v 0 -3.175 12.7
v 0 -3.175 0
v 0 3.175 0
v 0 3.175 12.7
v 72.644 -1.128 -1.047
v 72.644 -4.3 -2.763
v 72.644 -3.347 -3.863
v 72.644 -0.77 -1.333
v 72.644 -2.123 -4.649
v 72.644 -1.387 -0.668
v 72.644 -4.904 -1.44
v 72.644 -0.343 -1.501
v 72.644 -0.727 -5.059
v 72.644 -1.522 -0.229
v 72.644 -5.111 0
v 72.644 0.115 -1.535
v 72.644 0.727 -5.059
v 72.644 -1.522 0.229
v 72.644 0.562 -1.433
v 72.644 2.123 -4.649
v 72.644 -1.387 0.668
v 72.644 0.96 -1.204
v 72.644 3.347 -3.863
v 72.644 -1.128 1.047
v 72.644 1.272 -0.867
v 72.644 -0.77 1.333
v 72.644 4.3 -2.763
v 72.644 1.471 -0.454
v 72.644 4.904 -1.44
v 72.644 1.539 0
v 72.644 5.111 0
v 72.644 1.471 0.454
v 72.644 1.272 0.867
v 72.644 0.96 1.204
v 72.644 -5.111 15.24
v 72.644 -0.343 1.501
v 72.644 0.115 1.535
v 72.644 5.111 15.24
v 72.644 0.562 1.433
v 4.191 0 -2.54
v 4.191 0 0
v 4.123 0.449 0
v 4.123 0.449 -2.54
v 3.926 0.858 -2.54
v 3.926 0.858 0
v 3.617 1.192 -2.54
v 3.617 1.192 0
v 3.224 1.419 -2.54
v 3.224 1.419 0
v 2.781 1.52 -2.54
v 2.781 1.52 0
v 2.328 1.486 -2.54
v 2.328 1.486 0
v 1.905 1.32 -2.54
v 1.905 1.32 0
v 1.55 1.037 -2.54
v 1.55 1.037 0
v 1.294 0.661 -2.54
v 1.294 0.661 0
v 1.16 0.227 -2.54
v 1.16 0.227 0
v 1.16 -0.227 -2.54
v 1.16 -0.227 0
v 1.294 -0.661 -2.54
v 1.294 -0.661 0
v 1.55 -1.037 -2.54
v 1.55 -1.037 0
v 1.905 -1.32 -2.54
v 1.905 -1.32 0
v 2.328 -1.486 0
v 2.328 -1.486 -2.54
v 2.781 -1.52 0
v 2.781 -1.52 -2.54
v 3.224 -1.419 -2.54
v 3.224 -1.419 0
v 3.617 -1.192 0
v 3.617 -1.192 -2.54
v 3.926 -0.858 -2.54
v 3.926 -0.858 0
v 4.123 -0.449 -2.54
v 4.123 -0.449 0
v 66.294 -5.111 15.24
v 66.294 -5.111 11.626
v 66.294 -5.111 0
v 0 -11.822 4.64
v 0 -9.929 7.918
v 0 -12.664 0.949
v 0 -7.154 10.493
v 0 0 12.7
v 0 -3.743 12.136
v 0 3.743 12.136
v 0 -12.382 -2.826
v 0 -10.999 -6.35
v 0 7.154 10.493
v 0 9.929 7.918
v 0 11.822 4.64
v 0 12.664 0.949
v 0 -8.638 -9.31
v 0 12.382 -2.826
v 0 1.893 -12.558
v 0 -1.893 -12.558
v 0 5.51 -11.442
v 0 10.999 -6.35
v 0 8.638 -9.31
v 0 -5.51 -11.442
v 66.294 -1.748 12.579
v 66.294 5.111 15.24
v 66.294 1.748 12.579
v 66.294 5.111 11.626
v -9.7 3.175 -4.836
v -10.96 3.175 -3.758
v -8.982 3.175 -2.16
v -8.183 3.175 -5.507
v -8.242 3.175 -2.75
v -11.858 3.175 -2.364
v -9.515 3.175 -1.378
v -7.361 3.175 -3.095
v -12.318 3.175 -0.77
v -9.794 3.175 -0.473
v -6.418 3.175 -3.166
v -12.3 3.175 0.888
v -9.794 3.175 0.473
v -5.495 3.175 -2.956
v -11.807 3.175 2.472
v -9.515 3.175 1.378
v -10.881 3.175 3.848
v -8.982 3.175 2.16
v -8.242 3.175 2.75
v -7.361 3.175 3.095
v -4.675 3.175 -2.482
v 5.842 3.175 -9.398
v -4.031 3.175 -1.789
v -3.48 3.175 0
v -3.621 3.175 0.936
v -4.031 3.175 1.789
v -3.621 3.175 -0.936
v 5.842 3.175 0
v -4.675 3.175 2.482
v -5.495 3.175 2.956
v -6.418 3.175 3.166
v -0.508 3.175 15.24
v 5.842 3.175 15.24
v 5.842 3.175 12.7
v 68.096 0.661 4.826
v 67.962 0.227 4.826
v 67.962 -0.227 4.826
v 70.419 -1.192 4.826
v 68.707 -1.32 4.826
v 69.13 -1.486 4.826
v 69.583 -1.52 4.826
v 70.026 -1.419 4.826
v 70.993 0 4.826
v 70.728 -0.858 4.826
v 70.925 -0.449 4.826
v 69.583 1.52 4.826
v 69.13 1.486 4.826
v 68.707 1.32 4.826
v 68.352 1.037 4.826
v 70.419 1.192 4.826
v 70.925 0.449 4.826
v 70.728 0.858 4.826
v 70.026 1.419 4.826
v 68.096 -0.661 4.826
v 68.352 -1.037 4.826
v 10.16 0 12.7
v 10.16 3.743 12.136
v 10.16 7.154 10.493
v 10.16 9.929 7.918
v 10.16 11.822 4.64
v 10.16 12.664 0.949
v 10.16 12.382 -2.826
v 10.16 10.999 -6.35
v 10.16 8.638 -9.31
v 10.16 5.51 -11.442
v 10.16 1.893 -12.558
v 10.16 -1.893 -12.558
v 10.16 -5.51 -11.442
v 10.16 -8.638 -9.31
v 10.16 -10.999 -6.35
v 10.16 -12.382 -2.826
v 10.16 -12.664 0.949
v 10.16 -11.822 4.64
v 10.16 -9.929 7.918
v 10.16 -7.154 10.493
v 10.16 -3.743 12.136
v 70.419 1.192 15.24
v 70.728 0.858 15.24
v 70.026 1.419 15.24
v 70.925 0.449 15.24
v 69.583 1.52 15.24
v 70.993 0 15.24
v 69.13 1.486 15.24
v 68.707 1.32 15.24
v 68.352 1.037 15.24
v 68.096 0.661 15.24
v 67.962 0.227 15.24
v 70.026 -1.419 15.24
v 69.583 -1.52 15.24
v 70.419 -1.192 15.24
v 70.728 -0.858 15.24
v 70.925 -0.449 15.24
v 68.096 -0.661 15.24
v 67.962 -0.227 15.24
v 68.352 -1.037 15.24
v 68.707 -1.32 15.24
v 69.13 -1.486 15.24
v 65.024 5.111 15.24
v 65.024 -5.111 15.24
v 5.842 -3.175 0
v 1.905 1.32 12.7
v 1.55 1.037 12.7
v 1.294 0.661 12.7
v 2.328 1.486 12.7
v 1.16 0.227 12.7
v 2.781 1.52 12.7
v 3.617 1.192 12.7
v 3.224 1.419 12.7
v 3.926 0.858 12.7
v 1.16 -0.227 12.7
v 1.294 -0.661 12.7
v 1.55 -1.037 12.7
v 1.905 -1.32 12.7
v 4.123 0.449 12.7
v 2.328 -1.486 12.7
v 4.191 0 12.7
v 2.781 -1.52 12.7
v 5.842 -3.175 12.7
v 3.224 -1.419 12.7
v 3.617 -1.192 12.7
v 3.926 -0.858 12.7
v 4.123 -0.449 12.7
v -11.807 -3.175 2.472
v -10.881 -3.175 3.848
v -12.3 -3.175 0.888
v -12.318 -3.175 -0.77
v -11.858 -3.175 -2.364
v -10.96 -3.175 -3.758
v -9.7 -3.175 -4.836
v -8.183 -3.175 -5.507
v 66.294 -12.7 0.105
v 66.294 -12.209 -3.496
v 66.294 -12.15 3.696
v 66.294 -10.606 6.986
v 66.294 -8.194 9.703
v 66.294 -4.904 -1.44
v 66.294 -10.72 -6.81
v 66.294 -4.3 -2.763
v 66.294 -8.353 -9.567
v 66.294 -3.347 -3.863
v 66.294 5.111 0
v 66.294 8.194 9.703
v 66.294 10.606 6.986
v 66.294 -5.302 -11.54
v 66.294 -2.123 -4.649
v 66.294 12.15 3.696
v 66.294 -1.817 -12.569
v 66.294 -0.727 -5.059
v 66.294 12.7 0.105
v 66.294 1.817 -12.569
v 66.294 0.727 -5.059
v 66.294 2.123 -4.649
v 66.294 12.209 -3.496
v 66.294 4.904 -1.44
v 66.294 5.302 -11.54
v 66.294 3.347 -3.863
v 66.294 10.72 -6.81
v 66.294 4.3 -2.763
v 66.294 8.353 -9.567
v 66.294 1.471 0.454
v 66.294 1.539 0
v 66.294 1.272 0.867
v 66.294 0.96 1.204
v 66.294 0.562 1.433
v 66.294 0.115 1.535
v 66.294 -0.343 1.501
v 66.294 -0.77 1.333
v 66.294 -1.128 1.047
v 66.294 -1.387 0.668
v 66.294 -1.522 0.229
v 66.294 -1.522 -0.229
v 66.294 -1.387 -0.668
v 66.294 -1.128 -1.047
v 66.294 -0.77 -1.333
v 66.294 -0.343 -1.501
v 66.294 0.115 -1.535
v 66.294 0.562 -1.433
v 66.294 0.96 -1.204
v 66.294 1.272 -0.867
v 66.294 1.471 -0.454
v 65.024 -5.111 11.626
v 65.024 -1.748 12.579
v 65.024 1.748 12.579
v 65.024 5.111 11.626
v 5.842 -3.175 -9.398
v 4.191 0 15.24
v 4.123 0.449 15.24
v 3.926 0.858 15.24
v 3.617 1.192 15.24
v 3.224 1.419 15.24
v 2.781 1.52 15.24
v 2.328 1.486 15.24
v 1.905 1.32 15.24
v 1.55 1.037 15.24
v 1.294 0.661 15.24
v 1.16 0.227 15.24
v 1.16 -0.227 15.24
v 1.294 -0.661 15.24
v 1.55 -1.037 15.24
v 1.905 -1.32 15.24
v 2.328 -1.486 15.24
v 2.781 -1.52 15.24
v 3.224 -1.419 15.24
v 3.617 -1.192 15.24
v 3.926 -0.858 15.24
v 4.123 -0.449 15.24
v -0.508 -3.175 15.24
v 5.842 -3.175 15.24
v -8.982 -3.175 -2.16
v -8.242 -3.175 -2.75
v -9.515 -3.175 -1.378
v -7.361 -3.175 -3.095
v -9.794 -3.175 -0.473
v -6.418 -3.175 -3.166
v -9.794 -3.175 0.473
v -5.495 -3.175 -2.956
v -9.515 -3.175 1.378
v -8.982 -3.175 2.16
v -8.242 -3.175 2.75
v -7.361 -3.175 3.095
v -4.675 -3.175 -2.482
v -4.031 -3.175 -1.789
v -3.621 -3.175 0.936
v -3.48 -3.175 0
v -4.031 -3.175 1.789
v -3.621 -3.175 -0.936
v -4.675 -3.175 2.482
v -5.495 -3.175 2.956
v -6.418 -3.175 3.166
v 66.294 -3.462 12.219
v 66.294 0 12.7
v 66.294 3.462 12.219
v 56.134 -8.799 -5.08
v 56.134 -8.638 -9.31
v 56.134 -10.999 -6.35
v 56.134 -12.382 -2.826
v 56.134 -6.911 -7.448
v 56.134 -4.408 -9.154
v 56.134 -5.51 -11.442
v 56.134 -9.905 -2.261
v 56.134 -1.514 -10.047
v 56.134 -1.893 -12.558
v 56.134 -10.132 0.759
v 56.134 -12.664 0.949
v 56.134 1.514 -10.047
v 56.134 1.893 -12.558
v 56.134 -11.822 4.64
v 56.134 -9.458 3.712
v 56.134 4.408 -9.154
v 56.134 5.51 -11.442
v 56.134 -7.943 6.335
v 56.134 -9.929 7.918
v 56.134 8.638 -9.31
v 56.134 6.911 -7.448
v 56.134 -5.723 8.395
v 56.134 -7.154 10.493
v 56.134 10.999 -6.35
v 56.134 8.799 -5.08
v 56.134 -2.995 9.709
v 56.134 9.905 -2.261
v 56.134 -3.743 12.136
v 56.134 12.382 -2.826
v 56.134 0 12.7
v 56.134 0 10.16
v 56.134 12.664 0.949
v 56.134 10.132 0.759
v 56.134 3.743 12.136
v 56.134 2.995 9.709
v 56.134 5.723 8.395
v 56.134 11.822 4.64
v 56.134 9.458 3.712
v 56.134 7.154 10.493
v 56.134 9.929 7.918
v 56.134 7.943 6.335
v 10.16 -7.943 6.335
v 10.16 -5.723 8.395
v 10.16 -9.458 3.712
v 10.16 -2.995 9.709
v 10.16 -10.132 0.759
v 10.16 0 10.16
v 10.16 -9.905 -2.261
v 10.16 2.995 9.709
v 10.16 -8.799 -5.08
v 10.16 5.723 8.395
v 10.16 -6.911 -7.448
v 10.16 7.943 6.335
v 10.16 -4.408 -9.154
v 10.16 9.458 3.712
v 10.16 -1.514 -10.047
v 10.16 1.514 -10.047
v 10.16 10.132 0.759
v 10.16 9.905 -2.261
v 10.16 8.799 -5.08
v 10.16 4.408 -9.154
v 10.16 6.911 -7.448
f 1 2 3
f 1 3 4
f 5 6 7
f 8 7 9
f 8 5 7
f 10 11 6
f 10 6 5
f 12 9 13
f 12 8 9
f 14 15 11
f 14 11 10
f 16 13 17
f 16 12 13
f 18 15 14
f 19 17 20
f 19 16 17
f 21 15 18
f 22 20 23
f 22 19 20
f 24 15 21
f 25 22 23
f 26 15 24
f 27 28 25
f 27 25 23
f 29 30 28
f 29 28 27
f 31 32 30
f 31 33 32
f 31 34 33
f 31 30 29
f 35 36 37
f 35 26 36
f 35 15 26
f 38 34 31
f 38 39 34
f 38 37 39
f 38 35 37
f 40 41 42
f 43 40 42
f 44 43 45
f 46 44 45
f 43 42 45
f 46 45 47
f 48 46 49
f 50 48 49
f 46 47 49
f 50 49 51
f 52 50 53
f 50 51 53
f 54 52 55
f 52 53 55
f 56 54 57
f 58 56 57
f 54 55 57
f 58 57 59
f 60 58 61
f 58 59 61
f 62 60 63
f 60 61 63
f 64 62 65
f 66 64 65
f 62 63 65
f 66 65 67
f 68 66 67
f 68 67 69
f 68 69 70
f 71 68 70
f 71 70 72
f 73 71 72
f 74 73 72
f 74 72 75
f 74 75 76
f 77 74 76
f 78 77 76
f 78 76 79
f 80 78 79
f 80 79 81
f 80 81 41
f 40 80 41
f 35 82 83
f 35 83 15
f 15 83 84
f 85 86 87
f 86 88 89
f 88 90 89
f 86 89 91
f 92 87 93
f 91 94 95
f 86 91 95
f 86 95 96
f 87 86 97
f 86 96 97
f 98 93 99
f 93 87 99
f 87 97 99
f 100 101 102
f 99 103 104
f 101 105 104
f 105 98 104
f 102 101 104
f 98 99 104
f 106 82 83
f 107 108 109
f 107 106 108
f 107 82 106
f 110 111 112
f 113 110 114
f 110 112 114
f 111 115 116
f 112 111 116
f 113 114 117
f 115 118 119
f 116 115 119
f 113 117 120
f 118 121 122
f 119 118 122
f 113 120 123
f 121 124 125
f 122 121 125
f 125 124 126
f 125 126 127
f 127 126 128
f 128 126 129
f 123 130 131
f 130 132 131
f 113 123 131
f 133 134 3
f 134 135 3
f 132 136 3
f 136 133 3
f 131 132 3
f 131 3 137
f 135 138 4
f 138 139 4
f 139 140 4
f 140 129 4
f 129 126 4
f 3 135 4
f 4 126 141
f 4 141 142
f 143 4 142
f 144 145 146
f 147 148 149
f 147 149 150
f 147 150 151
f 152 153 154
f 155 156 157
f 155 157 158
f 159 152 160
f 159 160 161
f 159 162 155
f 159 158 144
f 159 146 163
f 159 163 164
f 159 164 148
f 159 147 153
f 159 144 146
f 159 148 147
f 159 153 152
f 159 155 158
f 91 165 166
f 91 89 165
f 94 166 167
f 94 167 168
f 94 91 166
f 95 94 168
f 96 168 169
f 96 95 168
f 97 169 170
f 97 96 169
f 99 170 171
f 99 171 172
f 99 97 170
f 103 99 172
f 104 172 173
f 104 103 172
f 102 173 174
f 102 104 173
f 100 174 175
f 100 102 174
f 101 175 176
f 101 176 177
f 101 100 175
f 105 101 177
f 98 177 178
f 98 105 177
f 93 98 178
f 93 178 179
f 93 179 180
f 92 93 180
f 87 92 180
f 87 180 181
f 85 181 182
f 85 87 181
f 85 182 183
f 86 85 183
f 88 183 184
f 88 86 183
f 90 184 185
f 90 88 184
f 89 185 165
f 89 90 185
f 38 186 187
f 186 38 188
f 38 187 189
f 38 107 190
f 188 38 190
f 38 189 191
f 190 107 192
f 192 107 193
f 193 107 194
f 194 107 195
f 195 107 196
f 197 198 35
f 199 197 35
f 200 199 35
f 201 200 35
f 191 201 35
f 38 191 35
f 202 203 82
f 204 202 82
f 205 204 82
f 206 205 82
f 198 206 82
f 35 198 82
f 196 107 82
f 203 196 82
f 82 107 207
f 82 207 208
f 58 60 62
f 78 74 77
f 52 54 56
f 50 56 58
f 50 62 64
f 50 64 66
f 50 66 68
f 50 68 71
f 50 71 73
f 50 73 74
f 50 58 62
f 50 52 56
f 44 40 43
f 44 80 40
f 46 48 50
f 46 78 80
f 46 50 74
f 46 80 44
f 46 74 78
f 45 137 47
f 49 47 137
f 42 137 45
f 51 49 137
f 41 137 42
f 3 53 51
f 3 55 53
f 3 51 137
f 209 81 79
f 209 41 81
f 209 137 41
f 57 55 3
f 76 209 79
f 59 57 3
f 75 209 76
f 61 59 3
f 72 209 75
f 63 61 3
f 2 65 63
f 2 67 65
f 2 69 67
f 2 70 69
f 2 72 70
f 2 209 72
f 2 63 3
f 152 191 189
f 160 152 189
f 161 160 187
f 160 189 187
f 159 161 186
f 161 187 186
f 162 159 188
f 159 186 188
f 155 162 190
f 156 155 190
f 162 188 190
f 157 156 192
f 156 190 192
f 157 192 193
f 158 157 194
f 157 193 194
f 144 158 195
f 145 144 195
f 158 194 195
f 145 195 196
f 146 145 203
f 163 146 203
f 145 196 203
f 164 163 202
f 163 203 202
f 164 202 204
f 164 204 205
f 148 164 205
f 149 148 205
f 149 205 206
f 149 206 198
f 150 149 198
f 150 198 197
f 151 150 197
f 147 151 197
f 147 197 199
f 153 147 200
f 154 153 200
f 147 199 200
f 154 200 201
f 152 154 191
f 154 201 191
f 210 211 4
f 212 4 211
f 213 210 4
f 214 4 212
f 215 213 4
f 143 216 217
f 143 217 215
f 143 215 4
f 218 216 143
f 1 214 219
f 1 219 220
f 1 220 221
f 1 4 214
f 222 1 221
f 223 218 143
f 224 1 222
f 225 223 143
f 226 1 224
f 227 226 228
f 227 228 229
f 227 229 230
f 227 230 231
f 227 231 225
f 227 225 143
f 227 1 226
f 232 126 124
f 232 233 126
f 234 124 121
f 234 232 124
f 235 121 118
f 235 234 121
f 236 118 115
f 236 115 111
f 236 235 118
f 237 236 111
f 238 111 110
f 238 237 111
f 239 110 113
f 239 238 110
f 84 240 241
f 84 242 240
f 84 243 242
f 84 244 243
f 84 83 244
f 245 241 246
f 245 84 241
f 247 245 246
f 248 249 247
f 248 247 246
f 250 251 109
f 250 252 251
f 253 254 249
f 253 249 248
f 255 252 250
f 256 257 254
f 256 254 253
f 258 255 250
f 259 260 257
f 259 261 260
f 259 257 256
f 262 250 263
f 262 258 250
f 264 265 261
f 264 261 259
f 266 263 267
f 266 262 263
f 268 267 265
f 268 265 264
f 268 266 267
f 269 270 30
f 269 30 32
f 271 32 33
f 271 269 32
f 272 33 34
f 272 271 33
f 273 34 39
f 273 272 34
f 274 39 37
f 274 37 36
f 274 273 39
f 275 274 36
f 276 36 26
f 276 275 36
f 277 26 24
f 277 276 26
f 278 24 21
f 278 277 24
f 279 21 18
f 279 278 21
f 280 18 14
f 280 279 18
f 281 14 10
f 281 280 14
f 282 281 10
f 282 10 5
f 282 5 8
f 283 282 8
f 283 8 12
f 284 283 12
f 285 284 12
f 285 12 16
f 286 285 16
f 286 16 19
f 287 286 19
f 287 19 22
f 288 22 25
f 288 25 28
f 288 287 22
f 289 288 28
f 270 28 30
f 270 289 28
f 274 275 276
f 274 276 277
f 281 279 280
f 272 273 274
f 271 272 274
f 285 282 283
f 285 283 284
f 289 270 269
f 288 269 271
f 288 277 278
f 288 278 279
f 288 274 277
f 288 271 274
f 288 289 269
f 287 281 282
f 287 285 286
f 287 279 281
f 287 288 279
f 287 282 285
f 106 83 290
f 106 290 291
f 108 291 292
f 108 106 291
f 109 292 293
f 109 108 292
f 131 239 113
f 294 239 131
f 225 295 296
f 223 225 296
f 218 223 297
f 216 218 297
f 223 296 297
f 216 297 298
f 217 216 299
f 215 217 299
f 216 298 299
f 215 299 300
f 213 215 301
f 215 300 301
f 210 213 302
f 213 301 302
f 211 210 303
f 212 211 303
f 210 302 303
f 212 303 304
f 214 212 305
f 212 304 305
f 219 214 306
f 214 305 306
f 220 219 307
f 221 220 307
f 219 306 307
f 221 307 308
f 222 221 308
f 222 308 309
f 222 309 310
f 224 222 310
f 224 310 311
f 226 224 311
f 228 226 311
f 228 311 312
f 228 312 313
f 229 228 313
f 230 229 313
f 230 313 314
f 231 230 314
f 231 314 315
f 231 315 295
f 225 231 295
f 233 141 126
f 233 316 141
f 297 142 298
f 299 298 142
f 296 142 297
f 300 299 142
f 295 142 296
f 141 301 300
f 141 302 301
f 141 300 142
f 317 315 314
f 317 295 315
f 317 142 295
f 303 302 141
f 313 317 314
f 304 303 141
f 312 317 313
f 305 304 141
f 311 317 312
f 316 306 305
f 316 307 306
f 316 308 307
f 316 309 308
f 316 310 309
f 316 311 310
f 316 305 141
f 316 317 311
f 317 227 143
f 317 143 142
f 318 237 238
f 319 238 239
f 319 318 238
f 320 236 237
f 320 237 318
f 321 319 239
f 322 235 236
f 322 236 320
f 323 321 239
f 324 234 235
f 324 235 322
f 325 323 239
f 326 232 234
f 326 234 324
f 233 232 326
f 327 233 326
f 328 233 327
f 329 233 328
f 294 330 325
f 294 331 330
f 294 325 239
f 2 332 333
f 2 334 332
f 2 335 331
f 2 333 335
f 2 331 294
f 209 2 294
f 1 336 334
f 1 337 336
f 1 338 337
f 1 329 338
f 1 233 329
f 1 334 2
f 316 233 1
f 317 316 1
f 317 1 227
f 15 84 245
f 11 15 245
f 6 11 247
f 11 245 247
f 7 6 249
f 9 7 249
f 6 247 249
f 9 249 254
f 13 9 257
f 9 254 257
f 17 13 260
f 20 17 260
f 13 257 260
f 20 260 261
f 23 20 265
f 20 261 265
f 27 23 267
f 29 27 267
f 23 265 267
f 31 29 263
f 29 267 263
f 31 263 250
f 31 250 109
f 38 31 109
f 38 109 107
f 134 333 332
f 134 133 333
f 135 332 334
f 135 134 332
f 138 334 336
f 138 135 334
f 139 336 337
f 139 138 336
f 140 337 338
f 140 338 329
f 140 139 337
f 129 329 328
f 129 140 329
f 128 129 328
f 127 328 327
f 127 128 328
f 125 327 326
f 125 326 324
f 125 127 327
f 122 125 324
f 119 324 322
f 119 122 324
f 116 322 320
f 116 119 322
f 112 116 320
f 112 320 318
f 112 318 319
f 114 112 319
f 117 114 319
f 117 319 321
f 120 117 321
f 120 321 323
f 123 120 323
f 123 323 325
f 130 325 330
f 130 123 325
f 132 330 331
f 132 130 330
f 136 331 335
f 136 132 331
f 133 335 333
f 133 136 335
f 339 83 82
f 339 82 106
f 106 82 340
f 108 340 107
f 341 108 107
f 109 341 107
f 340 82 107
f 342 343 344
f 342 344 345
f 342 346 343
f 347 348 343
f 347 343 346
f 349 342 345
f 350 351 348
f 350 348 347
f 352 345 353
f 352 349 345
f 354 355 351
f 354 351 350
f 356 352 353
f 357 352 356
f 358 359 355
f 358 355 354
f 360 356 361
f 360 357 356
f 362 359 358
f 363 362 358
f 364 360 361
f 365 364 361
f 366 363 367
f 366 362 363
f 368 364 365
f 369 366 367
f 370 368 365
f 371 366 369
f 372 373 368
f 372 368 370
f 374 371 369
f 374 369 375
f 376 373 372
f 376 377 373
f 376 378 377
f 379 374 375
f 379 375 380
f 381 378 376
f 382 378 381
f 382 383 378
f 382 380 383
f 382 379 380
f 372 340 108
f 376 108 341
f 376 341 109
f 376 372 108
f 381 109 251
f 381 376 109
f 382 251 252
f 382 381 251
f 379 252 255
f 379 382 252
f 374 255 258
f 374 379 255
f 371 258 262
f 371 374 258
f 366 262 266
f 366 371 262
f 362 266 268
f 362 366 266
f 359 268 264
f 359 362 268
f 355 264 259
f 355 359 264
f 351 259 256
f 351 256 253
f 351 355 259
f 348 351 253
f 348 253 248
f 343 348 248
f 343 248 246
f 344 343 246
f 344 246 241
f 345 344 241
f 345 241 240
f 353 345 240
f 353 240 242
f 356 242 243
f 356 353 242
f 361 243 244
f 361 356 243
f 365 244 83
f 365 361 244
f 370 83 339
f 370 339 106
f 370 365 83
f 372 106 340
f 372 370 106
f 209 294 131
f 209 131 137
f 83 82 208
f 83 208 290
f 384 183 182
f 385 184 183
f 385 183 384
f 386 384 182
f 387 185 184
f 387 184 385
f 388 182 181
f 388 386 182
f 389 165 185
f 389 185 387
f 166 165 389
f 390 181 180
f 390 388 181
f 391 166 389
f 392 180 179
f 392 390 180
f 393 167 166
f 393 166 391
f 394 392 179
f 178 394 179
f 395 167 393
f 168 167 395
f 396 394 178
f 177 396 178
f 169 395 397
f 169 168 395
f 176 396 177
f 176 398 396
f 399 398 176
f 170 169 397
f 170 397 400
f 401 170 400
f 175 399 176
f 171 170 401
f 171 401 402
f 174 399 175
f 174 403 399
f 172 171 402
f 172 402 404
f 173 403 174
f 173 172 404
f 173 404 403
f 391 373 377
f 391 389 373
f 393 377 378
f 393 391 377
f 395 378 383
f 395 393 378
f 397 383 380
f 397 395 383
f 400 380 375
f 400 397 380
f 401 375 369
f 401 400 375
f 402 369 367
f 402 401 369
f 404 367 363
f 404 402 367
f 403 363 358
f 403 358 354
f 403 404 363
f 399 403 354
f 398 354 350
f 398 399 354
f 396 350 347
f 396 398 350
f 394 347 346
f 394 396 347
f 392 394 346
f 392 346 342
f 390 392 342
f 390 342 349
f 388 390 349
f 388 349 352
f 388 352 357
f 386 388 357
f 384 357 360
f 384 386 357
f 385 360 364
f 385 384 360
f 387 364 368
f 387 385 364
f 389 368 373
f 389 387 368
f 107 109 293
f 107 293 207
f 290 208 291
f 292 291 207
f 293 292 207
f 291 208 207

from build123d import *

# Parameters (mm, degrees)
F0_W      = 5.842
F0_H      = 12.7
F0_R      = 3.175
F2_DEPTH  = 3.175
F3_R      = 1.5393438835
F4_DEPTH  = 6.35
F5_DEPTH  = 1.27
F6_R      = 1.524
F9_DEPTH  = 17.78
F7_R      = 1.524
F10_DEPTH = 10.414


with BuildPart() as f1:
    # F0 (on Front) → F1 (revolve)
    with BuildSketch(Plane.XZ):
        with Locations((2.921, 6.35)):
            Rectangle(F0_W, F0_H)
        Polygon((5.842, 12.7), (5.842, 0), (66.294, 0), (66.294, 12.7), (56.134, 12.7), (56.134, 10.16), (10.16, 10.16), (10.16, 12.7), align=None)
    revolve(axis=Axis((33.147, 0, 0), (-1, 0, 0)))

    # F3 (on face) → F4 (join)
    with BuildSketch(Plane.YZ.offset(66.294)):
        with BuildLine():
            ThreePointArc((-5.1108804903, 0), (0, -5.1108804903), (5.1108804903, 0))
            ThreePointArc((5.1108804903, 0), (0, 5.1108804903), (-5.1108804903, 0))
        make_face()
        Circle(F3_R, mode=Mode.SUBTRACT)
        with BuildLine():
            ThreePointArc((-5.1108804903, 0), (0, 5.1108804903), (5.1108804903, 0))
            Line((5.1108804903, 0), (5.1108804903, 11.6262160918))
            ThreePointArc((5.1108804903, 11.6262160918), (0, 12.7), (-5.1108804903, 11.6262160918))
            Line((-5.1108804903, 11.6262160918), (-5.1108804903, 0))
        make_face()
        with BuildLine():
            ThreePointArc((-5.1108804903, 11.6262160918), (0, 12.7), (5.1108804903, 11.6262160918))
            Line((5.1108804903, 11.6262160918), (5.1108804903, 15.24))
            Line((5.1108804903, 15.24), (-5.1108804903, 15.24))
            Line((-5.1108804903, 15.24), (-5.1108804903, 11.6262160918))
        make_face()
    extrude(amount=F4_DEPTH)


with BuildPart() as f2:
    # F0 (on Front) → F2 (new body, symmetric)
    with BuildSketch(Plane.XZ):
        with BuildLine():
            ThreePointArc((-8.1826630726, -5.5069827884), (-3.1957909266, -4.5493385486), (-0.9398, 0))
            ThreePointArc((-0.9398, 0), (-4.5919612295, 5.3297205562), (-10.8806298187, 3.8475430269))
            ThreePointArc((-10.8806298187, 3.8475430269), (-12.1459778134, -1.5837270034), (-8.1826630726, -5.5069827884))
        make_face()
        with Locations((-6.6548, 0)):
            Circle(F0_R, mode=Mode.SUBTRACT)
        with BuildLine():
            Line((5.842, 0), (0, 0))
            Line((0, 0), (-0.9398, 0))
            ThreePointArc((-0.9398, 0), (-3.1957909266, -4.5493385486), (-8.1826630726, -5.5069827884))
            Line((-8.1826630726, -5.5069827884), (5.842, -9.398))
            Line((5.842, -9.398), (5.842, 0))
        make_face()
        with BuildLine():
            Line((-0.9398, 0), (0, 0))
            Line((0, 0), (0, 12.7))
            Line((0, 12.7), (5.842, 12.7))
            Line((5.842, 12.7), (5.842, 15.24))
            Line((5.842, 15.24), (-0.508, 15.24))
            Line((-0.508, 15.24), (-10.8806298187, 3.8475430269))
            ThreePointArc((-10.8806298187, 3.8475430269), (-4.5919612295, 5.3297205562), (-0.9398, 0))
        make_face()
    extrude(amount=F2_DEPTH, both=True)

    # F6 (on face) → F9 (cut)
    with BuildSketch(Plane.XY.offset(15.24)):
        with Locations((2.667, 0)):
            Circle(F6_R)
    extrude(amount=-F9_DEPTH, mode=Mode.SUBTRACT)


with BuildPart() as f5:
    # F5 (new): a face of the model
    f5_faces = [f1.part.faces().sort_by_distance(p)[0] for p in [
        (66.294, 0, 13.7766848253),
    ]]
    extrude(f5_faces, amount=F5_DEPTH)


with BuildPart() as f1_1:
    add(f1.part)

    # F7 (on face) → F10 (cut)
    with BuildSketch(Plane.XY.offset(15.24)):
        with Locations((69.469, 0)):
            Circle(F7_R)
    extrude(amount=-F10_DEPTH, mode=Mode.SUBTRACT)


solid = Compound([f2.part, f5.part, f1_1.part])
